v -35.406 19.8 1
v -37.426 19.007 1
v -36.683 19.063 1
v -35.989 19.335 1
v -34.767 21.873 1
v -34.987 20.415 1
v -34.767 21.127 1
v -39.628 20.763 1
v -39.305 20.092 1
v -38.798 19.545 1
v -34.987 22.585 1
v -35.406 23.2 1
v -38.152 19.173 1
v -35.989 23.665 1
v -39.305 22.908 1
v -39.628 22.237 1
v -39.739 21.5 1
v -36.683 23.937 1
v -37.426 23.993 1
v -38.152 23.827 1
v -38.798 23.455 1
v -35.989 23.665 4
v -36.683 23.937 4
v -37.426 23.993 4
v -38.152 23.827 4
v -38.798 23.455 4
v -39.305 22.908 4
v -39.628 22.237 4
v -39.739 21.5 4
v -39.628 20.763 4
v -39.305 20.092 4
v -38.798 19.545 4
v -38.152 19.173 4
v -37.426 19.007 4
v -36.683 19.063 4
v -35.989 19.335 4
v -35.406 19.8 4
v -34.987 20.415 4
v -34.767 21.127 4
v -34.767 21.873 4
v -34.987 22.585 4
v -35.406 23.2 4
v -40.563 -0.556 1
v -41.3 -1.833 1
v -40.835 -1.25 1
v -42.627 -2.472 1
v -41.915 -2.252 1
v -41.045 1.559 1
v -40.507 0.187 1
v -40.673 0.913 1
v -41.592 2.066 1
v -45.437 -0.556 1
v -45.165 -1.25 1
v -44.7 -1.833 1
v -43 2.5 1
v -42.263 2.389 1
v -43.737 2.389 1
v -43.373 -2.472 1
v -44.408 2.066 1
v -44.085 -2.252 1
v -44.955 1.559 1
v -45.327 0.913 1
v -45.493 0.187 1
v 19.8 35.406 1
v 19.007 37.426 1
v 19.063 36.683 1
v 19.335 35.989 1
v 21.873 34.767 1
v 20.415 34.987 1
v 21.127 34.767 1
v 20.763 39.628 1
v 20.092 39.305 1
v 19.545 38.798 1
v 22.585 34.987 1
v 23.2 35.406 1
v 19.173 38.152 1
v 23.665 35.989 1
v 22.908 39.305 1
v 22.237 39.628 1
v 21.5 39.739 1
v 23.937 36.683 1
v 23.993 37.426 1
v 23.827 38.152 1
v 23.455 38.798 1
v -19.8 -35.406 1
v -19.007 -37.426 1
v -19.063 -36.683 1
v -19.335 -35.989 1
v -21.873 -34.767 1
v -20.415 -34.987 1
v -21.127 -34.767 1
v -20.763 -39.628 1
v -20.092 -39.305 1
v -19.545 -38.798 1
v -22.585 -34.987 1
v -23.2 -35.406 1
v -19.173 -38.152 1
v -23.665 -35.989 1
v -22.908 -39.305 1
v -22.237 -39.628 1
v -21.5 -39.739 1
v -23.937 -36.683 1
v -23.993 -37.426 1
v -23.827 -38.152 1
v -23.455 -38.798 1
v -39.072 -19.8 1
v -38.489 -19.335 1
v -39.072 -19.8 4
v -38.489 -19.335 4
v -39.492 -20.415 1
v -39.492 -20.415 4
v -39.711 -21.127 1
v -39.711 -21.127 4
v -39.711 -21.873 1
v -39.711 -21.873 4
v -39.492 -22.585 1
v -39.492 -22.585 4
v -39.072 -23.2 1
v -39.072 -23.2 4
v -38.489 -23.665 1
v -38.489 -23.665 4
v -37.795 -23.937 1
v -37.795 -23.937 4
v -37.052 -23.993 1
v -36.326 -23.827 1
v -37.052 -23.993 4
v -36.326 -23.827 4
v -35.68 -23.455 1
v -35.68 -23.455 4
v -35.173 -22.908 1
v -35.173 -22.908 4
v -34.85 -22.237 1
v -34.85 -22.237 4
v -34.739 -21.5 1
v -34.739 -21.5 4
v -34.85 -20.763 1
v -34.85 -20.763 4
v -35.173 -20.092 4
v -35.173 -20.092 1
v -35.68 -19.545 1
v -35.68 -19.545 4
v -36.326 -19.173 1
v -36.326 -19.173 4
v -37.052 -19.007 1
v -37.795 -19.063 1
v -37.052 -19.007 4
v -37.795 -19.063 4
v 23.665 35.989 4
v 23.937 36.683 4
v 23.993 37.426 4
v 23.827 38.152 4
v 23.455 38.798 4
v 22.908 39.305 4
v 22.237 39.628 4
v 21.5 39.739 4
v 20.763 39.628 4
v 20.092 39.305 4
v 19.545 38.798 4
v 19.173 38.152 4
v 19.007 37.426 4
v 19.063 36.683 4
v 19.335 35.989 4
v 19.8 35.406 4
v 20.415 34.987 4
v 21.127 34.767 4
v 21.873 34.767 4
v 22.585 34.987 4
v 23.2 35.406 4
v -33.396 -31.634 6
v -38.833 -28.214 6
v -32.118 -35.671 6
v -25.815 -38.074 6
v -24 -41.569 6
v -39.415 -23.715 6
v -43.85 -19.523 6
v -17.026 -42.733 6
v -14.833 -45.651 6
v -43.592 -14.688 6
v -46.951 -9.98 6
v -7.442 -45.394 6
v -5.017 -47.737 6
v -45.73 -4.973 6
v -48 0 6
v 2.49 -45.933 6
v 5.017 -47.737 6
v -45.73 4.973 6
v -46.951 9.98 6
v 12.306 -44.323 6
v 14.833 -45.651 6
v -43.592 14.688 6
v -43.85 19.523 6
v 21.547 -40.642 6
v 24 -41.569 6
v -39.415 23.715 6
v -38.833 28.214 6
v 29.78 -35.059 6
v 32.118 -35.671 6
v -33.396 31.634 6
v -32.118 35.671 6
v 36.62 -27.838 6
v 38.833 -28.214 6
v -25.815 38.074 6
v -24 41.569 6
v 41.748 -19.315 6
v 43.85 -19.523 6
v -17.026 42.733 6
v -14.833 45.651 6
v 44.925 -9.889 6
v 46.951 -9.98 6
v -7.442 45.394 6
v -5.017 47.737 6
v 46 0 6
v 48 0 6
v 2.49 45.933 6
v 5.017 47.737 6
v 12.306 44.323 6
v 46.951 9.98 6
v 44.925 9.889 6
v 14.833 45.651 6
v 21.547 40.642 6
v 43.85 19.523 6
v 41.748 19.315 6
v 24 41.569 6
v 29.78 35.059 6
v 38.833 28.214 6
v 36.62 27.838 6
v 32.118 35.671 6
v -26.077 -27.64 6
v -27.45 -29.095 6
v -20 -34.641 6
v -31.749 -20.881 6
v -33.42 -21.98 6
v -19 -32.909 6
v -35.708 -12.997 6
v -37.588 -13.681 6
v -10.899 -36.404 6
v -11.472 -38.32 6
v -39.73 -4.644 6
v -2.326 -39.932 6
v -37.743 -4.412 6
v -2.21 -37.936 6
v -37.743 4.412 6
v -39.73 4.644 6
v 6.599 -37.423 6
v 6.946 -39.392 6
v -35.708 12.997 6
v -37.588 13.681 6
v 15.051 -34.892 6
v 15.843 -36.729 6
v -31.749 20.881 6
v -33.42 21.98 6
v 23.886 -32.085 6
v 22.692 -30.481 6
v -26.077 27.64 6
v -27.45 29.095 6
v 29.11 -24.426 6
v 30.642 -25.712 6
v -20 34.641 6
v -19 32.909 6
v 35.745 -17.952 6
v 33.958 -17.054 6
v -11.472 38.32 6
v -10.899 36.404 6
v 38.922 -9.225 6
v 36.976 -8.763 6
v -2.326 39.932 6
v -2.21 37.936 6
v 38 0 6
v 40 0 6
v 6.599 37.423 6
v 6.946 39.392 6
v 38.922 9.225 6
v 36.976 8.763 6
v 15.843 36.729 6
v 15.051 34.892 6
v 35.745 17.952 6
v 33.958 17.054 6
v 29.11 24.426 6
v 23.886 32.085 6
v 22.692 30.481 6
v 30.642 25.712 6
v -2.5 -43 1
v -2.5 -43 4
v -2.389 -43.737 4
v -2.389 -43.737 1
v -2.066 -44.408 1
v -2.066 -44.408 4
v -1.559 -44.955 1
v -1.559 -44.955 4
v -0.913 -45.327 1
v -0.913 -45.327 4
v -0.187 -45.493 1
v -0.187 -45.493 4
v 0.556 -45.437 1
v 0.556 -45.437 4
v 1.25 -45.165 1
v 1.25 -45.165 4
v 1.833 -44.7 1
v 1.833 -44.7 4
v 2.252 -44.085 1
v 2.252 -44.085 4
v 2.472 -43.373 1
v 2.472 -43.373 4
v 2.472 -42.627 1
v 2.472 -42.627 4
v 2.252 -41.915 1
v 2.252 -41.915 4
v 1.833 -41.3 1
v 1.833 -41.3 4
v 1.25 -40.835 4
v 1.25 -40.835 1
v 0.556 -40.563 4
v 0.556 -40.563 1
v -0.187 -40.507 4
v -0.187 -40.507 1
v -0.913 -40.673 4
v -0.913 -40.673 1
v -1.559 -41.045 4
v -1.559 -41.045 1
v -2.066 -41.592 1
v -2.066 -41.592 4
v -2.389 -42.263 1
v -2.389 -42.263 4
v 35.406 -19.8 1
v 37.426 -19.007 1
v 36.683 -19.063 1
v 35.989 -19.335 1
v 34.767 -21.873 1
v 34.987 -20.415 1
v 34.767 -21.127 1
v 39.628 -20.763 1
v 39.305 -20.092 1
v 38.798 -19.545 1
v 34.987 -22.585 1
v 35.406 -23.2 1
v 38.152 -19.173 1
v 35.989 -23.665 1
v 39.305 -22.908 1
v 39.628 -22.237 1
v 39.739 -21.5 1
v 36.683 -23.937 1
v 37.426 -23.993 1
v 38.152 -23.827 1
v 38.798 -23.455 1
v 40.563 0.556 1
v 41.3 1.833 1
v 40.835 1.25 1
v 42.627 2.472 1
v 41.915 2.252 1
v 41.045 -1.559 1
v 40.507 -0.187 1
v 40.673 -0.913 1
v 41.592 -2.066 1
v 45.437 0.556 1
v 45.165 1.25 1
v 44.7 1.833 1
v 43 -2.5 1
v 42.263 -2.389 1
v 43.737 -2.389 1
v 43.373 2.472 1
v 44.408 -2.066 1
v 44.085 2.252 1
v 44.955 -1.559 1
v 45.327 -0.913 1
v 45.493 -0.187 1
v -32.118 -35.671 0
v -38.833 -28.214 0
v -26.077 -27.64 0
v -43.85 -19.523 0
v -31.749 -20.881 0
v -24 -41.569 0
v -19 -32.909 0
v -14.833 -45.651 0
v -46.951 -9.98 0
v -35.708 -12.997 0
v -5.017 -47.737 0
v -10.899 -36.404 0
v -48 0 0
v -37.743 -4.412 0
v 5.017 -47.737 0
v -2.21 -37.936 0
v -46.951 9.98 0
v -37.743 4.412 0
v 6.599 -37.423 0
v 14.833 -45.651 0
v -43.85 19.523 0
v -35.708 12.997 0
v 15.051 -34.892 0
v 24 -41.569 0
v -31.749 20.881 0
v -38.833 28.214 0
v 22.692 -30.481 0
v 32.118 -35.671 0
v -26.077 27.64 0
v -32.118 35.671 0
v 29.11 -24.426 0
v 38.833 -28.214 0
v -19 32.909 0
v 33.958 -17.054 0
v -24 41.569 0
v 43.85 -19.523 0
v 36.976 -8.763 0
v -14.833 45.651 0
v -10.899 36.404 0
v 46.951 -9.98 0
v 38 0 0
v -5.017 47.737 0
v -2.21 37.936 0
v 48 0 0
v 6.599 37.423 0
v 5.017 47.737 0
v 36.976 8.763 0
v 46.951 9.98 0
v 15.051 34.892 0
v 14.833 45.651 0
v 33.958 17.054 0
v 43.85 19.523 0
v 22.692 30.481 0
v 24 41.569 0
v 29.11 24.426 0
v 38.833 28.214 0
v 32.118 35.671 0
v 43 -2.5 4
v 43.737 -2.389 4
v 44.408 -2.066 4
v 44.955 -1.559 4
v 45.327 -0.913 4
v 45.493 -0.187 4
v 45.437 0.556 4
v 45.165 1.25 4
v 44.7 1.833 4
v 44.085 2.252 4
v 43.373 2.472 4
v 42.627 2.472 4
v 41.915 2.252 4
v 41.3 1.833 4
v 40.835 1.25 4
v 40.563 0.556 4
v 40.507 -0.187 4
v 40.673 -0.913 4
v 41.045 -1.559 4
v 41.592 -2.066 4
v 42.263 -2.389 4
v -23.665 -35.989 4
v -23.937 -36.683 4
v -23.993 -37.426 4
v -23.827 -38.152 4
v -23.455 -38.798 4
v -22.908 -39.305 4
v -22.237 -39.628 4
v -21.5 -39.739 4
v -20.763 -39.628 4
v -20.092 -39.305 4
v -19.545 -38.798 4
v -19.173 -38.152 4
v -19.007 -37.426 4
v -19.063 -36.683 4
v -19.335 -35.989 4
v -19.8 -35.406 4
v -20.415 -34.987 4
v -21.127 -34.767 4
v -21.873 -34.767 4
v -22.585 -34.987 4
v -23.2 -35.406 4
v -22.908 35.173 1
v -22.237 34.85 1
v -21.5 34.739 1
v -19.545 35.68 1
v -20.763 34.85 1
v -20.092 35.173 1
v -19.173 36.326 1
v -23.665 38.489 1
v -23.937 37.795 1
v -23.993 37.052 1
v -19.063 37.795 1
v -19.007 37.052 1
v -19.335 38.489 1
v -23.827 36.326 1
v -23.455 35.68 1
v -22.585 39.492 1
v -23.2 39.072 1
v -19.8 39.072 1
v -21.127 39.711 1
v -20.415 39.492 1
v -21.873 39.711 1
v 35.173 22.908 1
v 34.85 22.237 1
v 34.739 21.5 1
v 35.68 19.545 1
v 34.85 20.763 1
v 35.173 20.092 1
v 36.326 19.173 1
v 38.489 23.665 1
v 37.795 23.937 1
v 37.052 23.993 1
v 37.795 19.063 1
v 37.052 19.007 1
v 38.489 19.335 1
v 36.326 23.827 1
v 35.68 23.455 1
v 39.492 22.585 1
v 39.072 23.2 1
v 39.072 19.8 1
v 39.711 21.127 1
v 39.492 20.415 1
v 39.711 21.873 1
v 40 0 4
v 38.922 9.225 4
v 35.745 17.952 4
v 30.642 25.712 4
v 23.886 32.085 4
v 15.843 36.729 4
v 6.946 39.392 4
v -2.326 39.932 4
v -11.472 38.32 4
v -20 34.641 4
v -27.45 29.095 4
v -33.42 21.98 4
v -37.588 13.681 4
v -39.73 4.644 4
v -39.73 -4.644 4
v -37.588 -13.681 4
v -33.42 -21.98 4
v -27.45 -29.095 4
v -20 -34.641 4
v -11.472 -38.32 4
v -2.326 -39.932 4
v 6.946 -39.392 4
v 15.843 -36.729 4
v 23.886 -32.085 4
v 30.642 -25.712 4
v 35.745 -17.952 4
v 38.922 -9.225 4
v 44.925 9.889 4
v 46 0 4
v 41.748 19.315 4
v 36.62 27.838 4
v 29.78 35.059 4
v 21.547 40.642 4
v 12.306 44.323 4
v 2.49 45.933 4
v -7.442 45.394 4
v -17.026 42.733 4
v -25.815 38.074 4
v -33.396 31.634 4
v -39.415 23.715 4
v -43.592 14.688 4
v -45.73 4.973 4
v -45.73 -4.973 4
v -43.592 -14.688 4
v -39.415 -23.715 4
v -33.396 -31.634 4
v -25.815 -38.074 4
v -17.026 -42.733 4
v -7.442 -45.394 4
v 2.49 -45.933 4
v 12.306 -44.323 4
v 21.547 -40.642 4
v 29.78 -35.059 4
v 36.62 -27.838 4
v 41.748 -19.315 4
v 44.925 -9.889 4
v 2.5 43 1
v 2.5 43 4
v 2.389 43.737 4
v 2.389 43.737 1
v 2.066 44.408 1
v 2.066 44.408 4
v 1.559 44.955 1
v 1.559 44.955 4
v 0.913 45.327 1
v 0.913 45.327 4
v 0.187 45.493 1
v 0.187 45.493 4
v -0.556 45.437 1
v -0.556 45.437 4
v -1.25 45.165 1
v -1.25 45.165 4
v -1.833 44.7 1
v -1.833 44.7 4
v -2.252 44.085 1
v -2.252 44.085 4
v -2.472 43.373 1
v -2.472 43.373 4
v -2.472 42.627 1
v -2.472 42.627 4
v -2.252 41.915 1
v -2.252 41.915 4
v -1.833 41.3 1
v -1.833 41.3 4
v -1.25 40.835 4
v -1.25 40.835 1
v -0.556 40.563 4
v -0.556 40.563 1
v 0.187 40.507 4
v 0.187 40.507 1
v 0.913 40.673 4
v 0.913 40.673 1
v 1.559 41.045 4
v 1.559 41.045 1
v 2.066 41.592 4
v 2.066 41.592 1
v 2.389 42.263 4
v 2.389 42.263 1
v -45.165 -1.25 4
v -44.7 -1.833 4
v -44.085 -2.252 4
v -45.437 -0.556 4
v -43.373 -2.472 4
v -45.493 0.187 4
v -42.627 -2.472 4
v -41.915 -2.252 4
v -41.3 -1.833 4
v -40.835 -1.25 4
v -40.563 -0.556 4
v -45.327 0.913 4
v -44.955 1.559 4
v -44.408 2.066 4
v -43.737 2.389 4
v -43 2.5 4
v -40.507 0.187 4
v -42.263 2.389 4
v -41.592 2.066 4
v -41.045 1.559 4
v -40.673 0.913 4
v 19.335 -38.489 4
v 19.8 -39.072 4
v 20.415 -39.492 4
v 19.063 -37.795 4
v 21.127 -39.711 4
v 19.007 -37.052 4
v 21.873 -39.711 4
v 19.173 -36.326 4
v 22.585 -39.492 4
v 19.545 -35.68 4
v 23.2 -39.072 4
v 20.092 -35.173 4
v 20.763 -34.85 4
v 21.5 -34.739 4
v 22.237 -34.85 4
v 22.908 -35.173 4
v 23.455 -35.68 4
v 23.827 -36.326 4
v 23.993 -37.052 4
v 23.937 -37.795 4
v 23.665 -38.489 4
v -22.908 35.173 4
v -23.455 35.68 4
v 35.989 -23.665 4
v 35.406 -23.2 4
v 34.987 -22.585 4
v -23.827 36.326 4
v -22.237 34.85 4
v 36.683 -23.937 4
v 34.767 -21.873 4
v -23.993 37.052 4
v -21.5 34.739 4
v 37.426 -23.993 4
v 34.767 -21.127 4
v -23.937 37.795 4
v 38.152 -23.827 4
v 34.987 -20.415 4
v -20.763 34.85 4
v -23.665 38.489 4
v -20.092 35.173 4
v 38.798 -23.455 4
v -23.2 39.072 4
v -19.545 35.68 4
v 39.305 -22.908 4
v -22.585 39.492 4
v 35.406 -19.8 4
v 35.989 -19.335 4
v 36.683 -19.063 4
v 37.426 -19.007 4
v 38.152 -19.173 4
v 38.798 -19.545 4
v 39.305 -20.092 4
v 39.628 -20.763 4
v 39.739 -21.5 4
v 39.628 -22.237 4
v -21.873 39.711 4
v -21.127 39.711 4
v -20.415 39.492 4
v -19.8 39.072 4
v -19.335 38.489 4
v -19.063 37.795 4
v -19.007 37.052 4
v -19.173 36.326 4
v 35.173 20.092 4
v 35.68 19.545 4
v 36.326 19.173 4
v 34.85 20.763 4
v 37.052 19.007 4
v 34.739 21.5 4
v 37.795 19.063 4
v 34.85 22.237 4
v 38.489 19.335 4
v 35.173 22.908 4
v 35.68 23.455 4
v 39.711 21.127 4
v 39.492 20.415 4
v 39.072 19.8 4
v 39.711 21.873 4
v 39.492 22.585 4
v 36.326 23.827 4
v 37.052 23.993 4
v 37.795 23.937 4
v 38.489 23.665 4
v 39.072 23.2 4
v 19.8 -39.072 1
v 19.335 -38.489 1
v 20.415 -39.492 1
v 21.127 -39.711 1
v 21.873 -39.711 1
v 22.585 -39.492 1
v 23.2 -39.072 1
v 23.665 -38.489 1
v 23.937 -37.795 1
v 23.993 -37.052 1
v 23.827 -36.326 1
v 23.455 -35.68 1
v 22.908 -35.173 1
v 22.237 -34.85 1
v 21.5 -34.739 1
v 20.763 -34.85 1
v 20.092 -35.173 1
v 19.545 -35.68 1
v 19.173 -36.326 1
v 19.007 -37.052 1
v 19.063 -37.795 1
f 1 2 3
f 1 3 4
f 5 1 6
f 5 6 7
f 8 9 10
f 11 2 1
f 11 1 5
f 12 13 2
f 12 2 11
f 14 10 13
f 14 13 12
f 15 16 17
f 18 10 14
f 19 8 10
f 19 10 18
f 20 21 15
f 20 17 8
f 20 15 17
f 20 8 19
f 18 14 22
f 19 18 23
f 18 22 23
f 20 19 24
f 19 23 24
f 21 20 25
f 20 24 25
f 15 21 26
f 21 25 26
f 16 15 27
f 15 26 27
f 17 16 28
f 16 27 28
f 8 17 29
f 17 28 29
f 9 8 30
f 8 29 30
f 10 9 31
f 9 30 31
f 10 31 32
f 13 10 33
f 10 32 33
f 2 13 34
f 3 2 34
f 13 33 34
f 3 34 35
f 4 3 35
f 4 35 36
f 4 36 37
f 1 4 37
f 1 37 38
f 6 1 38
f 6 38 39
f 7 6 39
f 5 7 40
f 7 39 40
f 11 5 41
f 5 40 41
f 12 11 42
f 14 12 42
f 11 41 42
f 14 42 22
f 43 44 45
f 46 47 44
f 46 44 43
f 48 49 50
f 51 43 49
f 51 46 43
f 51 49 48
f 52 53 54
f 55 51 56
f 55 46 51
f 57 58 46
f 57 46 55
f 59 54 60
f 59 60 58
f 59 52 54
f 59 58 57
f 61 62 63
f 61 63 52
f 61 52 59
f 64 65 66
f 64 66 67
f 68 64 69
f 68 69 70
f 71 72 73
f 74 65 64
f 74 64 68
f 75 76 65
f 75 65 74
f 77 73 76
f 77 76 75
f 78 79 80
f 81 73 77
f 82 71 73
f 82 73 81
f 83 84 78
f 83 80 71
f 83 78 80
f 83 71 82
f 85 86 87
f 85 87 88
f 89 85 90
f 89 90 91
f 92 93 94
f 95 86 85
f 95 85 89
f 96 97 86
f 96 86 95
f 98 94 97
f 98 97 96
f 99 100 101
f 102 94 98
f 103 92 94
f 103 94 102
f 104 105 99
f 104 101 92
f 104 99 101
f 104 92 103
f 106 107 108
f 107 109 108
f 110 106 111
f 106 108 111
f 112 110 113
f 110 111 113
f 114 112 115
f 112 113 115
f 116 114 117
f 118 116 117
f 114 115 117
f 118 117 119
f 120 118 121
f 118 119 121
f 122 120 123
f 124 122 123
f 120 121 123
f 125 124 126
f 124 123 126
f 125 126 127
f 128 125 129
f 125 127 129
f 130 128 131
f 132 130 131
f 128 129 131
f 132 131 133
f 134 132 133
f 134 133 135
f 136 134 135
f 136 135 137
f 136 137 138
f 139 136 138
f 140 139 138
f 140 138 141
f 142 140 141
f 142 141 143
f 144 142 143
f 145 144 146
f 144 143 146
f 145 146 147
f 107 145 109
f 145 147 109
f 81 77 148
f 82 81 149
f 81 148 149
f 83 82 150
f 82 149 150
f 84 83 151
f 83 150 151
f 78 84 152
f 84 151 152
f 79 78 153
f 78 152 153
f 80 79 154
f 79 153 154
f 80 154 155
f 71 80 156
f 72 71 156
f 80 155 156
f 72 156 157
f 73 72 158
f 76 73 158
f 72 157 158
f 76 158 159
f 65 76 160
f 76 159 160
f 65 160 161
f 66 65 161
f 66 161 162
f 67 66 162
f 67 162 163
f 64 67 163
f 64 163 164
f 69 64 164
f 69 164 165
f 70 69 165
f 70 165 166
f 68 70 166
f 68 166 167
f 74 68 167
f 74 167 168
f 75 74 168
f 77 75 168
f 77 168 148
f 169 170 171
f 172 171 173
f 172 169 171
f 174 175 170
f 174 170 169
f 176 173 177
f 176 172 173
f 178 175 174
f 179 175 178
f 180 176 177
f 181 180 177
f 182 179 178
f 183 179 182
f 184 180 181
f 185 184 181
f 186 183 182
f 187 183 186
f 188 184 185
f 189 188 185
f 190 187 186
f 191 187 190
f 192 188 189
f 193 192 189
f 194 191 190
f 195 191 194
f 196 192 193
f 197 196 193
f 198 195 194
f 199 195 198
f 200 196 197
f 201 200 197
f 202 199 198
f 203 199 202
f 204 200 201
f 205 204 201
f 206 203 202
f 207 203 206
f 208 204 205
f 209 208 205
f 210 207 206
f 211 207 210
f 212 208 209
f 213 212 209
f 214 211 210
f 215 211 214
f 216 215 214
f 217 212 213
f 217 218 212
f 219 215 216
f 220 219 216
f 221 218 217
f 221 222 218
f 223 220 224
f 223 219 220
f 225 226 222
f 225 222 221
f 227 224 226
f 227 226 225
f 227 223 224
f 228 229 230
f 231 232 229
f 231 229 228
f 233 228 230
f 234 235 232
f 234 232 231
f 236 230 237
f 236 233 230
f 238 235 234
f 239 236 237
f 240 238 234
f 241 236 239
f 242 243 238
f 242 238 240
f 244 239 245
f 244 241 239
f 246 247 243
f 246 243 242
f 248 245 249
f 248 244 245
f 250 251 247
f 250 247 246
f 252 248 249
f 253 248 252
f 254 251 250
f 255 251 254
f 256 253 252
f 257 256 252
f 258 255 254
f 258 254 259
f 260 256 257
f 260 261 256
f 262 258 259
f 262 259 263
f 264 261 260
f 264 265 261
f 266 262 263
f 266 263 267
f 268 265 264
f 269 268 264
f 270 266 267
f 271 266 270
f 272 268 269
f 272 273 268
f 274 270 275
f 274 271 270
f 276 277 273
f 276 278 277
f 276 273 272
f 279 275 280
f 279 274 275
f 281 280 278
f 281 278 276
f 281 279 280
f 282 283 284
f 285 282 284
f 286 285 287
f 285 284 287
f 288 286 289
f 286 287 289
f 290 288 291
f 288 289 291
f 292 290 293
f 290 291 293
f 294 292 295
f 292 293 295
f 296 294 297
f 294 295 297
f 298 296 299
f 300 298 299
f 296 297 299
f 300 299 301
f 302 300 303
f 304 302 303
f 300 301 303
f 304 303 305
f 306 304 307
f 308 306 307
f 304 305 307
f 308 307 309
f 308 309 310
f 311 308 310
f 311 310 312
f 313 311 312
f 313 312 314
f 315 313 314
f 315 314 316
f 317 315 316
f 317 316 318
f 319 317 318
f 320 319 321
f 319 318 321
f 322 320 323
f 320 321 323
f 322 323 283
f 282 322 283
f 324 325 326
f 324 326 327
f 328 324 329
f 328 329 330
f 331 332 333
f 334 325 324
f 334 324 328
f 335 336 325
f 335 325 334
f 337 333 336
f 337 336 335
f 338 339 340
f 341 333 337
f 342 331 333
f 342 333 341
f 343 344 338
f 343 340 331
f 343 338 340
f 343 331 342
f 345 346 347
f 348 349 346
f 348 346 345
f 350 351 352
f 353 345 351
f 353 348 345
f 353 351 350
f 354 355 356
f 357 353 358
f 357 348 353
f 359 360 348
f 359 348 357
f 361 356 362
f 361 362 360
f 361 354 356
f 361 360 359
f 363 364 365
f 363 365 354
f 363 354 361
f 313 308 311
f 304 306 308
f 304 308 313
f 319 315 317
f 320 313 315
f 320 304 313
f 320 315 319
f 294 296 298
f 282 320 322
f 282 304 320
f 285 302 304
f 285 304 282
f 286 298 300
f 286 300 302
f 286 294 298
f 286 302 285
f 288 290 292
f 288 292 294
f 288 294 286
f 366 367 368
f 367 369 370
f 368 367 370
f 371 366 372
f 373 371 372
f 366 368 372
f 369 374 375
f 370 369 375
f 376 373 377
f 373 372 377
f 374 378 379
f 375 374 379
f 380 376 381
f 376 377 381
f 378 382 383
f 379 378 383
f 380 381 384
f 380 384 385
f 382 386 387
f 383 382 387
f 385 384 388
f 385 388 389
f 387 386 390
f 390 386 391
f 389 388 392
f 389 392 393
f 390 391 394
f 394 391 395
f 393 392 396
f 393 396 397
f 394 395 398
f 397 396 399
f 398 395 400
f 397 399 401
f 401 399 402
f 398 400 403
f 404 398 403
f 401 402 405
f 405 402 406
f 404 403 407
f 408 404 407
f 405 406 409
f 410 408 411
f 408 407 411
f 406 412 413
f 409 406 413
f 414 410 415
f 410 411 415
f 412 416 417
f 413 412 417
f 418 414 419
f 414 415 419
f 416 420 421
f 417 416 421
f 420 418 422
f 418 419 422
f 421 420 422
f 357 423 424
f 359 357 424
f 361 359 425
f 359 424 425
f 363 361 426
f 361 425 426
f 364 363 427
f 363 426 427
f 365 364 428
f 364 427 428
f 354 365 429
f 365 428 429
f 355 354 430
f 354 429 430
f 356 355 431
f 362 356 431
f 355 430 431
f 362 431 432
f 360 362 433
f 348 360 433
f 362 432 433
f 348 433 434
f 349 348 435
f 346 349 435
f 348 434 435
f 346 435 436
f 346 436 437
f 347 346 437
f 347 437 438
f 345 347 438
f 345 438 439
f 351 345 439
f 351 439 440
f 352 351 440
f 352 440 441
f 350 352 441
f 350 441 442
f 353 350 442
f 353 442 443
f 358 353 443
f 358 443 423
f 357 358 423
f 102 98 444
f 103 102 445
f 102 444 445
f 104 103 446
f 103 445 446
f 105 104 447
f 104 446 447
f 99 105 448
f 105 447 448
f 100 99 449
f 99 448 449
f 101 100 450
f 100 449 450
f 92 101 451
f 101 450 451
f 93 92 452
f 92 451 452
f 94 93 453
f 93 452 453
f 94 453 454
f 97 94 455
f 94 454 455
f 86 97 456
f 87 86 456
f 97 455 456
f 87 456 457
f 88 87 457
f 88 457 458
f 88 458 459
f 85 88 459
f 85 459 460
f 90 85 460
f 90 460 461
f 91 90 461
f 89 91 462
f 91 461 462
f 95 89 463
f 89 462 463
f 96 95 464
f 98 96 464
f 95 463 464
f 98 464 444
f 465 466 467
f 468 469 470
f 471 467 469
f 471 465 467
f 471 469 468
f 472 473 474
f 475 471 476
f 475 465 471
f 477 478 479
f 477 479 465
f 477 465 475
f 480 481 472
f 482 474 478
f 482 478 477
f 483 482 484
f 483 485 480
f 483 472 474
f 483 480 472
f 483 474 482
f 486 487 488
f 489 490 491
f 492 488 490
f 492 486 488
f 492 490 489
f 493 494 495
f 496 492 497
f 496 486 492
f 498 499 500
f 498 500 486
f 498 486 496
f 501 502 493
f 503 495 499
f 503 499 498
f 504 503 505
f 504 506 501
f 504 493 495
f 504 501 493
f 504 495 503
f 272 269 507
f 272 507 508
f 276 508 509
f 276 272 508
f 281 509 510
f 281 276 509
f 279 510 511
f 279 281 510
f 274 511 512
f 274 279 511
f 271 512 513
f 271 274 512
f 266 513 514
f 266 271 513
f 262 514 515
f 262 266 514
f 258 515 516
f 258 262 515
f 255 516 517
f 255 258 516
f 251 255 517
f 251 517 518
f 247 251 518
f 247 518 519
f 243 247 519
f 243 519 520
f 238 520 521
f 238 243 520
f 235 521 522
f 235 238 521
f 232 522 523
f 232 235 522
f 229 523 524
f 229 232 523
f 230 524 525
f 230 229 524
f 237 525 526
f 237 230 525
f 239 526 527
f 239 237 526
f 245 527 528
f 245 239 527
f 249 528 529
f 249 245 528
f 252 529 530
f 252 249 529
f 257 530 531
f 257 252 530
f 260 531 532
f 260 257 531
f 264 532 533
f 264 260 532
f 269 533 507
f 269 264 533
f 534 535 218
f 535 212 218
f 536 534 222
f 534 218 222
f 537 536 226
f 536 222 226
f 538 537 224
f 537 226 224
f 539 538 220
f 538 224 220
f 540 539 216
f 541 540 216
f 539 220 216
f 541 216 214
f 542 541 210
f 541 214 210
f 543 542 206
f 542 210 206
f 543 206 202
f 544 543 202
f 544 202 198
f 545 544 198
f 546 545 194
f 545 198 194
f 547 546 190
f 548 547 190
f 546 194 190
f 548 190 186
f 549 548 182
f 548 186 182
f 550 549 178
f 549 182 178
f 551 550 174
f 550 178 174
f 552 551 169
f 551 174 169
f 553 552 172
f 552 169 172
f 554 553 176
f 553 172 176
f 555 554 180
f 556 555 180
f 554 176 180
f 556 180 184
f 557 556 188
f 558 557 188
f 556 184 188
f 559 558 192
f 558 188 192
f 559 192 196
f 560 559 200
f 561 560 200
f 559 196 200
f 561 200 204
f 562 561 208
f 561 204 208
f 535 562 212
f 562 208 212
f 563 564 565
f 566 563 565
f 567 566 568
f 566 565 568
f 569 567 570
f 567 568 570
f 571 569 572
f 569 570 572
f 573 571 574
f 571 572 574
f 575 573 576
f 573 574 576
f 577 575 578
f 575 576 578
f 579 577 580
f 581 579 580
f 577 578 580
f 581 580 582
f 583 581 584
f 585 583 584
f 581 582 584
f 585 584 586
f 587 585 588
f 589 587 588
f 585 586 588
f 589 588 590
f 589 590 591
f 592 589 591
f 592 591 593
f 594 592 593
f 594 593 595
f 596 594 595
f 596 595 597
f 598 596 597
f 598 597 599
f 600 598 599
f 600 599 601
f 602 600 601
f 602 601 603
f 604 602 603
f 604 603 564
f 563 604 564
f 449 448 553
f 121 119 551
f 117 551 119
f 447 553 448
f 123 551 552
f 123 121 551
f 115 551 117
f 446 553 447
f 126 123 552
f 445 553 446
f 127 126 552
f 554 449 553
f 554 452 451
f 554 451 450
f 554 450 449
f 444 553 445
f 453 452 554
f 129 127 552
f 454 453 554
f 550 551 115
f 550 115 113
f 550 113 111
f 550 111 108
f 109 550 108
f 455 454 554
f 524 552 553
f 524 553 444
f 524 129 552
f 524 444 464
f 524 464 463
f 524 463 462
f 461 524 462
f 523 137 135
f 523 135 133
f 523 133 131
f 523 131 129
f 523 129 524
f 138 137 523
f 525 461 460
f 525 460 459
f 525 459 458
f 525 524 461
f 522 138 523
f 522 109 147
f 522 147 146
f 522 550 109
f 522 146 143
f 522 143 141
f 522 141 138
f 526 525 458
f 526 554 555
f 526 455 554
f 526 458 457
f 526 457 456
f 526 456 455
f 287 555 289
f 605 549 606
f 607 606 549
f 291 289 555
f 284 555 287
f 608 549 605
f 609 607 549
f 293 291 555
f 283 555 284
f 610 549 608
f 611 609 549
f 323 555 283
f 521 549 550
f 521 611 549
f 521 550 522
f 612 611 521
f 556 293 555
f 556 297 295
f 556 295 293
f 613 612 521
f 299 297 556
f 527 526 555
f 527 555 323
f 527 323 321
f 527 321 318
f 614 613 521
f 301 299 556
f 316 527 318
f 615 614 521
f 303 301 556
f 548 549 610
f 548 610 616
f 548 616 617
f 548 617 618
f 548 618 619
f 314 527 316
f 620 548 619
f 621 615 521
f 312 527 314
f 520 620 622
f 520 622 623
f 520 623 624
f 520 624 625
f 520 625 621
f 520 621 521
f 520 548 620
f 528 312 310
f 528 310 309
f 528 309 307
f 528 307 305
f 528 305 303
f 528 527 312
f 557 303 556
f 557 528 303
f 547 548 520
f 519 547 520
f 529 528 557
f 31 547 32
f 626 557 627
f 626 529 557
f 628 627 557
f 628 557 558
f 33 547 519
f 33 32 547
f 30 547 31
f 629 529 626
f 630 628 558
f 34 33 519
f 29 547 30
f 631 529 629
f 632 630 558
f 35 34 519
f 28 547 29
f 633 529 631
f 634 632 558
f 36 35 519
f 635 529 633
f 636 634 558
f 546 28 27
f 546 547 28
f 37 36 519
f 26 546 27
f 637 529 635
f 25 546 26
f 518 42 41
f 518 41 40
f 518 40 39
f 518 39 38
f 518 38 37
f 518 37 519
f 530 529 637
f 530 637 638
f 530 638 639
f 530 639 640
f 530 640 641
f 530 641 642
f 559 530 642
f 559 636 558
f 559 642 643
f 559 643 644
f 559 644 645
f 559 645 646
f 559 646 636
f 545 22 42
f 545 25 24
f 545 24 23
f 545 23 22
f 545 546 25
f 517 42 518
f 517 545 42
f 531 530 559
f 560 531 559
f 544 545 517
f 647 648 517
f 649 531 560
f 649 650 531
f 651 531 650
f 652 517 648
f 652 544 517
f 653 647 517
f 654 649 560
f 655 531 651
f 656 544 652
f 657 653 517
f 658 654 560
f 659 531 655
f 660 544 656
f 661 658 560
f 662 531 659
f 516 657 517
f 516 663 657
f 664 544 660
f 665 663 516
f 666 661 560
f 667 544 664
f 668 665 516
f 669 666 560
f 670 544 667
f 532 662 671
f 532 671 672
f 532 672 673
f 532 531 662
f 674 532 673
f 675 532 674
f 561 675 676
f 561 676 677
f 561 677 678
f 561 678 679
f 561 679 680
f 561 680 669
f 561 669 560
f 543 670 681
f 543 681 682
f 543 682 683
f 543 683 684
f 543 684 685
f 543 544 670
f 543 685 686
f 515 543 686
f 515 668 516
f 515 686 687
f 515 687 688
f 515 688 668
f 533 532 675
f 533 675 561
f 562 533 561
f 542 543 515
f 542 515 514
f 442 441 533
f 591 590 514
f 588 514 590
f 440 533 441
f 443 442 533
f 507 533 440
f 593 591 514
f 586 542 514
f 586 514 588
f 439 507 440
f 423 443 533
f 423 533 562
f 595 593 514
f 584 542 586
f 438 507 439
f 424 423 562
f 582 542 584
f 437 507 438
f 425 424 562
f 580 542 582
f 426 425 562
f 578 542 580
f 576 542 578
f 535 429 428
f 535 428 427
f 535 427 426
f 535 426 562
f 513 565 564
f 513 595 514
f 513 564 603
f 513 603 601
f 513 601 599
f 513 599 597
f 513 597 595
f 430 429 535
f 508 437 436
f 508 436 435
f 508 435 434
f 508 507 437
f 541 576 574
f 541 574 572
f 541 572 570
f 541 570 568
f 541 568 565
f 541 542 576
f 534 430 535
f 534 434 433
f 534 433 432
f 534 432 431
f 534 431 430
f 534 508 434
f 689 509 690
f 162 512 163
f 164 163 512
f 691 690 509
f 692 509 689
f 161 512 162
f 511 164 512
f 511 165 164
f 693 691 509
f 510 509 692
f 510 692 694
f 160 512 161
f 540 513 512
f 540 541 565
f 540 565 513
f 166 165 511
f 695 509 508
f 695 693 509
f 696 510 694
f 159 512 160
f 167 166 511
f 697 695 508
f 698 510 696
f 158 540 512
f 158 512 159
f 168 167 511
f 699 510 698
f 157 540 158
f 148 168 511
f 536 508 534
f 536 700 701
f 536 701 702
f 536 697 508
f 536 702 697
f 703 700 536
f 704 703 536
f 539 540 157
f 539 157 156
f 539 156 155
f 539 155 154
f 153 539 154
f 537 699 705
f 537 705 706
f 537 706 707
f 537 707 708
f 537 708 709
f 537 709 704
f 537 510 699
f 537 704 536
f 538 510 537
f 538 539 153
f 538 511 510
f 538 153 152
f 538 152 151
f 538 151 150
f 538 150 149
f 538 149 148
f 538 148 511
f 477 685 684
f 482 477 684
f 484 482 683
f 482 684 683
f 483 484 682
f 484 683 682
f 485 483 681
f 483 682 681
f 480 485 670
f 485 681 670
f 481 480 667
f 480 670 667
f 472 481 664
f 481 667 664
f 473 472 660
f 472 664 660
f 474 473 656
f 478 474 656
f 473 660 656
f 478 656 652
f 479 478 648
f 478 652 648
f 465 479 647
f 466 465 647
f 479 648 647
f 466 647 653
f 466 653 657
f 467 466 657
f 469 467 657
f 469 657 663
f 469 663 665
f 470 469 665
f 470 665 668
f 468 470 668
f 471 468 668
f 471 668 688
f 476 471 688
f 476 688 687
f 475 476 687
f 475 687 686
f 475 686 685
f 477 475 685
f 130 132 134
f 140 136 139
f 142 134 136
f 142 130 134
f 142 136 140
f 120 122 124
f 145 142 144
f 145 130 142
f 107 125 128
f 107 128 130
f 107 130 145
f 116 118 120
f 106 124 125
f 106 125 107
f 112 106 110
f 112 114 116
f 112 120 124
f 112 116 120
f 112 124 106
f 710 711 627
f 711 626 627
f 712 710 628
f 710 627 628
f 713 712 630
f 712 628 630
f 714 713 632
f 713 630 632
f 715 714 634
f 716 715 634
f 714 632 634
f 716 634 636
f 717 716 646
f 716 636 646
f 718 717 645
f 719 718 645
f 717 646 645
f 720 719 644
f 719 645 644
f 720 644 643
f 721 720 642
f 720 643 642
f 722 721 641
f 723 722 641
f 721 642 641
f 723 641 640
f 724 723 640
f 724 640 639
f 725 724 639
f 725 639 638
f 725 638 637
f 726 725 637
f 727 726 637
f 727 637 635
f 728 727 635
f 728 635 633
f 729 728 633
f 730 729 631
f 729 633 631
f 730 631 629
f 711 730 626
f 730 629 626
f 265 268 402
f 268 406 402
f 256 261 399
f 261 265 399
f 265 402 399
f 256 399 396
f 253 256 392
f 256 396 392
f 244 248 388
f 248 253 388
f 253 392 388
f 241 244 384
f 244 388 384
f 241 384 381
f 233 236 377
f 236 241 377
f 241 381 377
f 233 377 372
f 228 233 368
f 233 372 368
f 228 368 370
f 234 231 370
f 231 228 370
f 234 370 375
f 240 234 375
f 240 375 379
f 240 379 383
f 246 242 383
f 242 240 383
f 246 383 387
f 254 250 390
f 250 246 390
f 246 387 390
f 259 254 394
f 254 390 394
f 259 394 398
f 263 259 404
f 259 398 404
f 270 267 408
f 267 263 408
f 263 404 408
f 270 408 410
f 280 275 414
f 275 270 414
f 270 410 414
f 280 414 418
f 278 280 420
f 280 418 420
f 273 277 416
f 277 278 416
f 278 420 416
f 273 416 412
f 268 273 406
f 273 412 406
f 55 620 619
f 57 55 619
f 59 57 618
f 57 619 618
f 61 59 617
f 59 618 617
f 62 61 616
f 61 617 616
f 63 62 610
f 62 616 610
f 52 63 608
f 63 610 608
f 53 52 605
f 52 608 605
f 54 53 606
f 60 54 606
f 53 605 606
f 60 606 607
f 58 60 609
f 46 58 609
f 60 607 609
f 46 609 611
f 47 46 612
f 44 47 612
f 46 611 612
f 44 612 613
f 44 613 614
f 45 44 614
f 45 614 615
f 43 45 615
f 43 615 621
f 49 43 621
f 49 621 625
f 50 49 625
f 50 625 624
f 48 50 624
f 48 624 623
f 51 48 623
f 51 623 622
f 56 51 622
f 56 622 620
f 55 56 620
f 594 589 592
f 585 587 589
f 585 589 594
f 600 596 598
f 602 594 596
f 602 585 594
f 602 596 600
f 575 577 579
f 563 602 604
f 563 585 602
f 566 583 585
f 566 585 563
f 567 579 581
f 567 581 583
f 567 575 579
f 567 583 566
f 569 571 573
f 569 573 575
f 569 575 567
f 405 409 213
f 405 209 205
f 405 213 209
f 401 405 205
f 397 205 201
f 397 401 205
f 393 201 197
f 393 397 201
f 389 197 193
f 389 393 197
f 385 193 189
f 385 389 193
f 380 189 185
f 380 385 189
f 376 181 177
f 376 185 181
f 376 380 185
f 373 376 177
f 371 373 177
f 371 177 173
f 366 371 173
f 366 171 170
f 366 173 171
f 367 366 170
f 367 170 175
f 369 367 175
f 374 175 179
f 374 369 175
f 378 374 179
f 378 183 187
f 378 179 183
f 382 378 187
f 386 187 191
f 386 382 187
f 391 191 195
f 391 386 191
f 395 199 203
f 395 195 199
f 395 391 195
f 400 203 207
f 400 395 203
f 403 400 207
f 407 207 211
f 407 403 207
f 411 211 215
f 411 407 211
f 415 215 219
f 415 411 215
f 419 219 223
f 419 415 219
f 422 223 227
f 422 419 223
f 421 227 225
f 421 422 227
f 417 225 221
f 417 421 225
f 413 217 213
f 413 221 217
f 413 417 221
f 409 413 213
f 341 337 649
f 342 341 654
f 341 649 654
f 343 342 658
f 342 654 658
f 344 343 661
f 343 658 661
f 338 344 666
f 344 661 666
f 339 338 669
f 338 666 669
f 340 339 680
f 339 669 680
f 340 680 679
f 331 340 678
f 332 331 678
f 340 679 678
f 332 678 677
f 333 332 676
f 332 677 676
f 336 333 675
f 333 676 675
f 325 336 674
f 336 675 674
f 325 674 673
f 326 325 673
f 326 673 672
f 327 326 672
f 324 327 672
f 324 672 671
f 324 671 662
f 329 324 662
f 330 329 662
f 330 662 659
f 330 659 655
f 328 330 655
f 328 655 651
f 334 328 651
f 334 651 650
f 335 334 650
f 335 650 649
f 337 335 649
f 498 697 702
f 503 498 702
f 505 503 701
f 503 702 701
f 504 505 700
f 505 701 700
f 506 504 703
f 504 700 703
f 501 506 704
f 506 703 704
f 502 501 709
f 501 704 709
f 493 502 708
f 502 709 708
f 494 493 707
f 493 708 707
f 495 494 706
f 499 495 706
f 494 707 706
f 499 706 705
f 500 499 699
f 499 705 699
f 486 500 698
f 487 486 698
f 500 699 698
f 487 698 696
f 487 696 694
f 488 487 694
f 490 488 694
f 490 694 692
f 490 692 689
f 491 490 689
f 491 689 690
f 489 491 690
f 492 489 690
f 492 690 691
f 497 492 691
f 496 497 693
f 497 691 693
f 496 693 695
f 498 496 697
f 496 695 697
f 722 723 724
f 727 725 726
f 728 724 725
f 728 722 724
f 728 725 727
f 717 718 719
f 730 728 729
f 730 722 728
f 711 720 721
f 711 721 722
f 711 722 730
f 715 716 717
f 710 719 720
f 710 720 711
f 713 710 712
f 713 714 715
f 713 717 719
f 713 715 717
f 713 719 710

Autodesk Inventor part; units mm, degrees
ref_plane "YZ Plane" through (0, 0, 0) normal (1, 0, 0) x (0, 1, 0)
ref_plane "XZ Plane" through (0, 0, 0) normal (0, 1, 0) x (-1, 0, 0)
ref_plane "XY Plane" through (0, 0, 0) normal (0, 0, 1) x (1, 0, 0)
sketch "Skizze1" plane through (0, 0, 0) normal (0, 0, 1) x (1, 0, 0)
  circle A0 centre (0, 0) radius 38
  circle A1 centre (0, 0) radius 48
  dimension "d0" = 76
  dimension "d1" = 10
extrude "Extrusion1" add sketch "Skizze1" along normal blind 6
sketch "Skizze3" plane through (0, 0, 6) normal (0, 0, 1) x (1, 0, 0)
  circle A0 centre (0, 0) radius 40
  circle A1 centre (0, 0) radius 46
  circle A2 centre (0, 0) radius 38 projected
  circle A3 centre (0, 0) radius 48 projected
  dimension "d8" = 2
  dimension "d9" = 2
extrude "Extrusion3" cut sketch "Skizze3" against normal blind 2 contours A1
sketch "Skizze5" plane through (0, 0, 4) normal (0, 0, 1) x (1, 0, 0)
  circle A0 centre (0, 0) radius 46 projected
  line L0 (0, 46) -> (0, 40)
  circle A1 centre (0, 0) radius 40 projected
  circle A2 centre (0, 43) radius 2.5
  dimension "d12" = 5
extrude "Extrusion4" cut sketch "Skizze5" against normal blind 3 contours A2 L0 | L0 A2
pattern_circular "Runde Anordnung1" count 12 over 360 about axis through (0, 0, -10) along (0, 0, 1) of "Extrusion4"
properties part number "P_magnetCase" material "ABS-Kunststoff"
